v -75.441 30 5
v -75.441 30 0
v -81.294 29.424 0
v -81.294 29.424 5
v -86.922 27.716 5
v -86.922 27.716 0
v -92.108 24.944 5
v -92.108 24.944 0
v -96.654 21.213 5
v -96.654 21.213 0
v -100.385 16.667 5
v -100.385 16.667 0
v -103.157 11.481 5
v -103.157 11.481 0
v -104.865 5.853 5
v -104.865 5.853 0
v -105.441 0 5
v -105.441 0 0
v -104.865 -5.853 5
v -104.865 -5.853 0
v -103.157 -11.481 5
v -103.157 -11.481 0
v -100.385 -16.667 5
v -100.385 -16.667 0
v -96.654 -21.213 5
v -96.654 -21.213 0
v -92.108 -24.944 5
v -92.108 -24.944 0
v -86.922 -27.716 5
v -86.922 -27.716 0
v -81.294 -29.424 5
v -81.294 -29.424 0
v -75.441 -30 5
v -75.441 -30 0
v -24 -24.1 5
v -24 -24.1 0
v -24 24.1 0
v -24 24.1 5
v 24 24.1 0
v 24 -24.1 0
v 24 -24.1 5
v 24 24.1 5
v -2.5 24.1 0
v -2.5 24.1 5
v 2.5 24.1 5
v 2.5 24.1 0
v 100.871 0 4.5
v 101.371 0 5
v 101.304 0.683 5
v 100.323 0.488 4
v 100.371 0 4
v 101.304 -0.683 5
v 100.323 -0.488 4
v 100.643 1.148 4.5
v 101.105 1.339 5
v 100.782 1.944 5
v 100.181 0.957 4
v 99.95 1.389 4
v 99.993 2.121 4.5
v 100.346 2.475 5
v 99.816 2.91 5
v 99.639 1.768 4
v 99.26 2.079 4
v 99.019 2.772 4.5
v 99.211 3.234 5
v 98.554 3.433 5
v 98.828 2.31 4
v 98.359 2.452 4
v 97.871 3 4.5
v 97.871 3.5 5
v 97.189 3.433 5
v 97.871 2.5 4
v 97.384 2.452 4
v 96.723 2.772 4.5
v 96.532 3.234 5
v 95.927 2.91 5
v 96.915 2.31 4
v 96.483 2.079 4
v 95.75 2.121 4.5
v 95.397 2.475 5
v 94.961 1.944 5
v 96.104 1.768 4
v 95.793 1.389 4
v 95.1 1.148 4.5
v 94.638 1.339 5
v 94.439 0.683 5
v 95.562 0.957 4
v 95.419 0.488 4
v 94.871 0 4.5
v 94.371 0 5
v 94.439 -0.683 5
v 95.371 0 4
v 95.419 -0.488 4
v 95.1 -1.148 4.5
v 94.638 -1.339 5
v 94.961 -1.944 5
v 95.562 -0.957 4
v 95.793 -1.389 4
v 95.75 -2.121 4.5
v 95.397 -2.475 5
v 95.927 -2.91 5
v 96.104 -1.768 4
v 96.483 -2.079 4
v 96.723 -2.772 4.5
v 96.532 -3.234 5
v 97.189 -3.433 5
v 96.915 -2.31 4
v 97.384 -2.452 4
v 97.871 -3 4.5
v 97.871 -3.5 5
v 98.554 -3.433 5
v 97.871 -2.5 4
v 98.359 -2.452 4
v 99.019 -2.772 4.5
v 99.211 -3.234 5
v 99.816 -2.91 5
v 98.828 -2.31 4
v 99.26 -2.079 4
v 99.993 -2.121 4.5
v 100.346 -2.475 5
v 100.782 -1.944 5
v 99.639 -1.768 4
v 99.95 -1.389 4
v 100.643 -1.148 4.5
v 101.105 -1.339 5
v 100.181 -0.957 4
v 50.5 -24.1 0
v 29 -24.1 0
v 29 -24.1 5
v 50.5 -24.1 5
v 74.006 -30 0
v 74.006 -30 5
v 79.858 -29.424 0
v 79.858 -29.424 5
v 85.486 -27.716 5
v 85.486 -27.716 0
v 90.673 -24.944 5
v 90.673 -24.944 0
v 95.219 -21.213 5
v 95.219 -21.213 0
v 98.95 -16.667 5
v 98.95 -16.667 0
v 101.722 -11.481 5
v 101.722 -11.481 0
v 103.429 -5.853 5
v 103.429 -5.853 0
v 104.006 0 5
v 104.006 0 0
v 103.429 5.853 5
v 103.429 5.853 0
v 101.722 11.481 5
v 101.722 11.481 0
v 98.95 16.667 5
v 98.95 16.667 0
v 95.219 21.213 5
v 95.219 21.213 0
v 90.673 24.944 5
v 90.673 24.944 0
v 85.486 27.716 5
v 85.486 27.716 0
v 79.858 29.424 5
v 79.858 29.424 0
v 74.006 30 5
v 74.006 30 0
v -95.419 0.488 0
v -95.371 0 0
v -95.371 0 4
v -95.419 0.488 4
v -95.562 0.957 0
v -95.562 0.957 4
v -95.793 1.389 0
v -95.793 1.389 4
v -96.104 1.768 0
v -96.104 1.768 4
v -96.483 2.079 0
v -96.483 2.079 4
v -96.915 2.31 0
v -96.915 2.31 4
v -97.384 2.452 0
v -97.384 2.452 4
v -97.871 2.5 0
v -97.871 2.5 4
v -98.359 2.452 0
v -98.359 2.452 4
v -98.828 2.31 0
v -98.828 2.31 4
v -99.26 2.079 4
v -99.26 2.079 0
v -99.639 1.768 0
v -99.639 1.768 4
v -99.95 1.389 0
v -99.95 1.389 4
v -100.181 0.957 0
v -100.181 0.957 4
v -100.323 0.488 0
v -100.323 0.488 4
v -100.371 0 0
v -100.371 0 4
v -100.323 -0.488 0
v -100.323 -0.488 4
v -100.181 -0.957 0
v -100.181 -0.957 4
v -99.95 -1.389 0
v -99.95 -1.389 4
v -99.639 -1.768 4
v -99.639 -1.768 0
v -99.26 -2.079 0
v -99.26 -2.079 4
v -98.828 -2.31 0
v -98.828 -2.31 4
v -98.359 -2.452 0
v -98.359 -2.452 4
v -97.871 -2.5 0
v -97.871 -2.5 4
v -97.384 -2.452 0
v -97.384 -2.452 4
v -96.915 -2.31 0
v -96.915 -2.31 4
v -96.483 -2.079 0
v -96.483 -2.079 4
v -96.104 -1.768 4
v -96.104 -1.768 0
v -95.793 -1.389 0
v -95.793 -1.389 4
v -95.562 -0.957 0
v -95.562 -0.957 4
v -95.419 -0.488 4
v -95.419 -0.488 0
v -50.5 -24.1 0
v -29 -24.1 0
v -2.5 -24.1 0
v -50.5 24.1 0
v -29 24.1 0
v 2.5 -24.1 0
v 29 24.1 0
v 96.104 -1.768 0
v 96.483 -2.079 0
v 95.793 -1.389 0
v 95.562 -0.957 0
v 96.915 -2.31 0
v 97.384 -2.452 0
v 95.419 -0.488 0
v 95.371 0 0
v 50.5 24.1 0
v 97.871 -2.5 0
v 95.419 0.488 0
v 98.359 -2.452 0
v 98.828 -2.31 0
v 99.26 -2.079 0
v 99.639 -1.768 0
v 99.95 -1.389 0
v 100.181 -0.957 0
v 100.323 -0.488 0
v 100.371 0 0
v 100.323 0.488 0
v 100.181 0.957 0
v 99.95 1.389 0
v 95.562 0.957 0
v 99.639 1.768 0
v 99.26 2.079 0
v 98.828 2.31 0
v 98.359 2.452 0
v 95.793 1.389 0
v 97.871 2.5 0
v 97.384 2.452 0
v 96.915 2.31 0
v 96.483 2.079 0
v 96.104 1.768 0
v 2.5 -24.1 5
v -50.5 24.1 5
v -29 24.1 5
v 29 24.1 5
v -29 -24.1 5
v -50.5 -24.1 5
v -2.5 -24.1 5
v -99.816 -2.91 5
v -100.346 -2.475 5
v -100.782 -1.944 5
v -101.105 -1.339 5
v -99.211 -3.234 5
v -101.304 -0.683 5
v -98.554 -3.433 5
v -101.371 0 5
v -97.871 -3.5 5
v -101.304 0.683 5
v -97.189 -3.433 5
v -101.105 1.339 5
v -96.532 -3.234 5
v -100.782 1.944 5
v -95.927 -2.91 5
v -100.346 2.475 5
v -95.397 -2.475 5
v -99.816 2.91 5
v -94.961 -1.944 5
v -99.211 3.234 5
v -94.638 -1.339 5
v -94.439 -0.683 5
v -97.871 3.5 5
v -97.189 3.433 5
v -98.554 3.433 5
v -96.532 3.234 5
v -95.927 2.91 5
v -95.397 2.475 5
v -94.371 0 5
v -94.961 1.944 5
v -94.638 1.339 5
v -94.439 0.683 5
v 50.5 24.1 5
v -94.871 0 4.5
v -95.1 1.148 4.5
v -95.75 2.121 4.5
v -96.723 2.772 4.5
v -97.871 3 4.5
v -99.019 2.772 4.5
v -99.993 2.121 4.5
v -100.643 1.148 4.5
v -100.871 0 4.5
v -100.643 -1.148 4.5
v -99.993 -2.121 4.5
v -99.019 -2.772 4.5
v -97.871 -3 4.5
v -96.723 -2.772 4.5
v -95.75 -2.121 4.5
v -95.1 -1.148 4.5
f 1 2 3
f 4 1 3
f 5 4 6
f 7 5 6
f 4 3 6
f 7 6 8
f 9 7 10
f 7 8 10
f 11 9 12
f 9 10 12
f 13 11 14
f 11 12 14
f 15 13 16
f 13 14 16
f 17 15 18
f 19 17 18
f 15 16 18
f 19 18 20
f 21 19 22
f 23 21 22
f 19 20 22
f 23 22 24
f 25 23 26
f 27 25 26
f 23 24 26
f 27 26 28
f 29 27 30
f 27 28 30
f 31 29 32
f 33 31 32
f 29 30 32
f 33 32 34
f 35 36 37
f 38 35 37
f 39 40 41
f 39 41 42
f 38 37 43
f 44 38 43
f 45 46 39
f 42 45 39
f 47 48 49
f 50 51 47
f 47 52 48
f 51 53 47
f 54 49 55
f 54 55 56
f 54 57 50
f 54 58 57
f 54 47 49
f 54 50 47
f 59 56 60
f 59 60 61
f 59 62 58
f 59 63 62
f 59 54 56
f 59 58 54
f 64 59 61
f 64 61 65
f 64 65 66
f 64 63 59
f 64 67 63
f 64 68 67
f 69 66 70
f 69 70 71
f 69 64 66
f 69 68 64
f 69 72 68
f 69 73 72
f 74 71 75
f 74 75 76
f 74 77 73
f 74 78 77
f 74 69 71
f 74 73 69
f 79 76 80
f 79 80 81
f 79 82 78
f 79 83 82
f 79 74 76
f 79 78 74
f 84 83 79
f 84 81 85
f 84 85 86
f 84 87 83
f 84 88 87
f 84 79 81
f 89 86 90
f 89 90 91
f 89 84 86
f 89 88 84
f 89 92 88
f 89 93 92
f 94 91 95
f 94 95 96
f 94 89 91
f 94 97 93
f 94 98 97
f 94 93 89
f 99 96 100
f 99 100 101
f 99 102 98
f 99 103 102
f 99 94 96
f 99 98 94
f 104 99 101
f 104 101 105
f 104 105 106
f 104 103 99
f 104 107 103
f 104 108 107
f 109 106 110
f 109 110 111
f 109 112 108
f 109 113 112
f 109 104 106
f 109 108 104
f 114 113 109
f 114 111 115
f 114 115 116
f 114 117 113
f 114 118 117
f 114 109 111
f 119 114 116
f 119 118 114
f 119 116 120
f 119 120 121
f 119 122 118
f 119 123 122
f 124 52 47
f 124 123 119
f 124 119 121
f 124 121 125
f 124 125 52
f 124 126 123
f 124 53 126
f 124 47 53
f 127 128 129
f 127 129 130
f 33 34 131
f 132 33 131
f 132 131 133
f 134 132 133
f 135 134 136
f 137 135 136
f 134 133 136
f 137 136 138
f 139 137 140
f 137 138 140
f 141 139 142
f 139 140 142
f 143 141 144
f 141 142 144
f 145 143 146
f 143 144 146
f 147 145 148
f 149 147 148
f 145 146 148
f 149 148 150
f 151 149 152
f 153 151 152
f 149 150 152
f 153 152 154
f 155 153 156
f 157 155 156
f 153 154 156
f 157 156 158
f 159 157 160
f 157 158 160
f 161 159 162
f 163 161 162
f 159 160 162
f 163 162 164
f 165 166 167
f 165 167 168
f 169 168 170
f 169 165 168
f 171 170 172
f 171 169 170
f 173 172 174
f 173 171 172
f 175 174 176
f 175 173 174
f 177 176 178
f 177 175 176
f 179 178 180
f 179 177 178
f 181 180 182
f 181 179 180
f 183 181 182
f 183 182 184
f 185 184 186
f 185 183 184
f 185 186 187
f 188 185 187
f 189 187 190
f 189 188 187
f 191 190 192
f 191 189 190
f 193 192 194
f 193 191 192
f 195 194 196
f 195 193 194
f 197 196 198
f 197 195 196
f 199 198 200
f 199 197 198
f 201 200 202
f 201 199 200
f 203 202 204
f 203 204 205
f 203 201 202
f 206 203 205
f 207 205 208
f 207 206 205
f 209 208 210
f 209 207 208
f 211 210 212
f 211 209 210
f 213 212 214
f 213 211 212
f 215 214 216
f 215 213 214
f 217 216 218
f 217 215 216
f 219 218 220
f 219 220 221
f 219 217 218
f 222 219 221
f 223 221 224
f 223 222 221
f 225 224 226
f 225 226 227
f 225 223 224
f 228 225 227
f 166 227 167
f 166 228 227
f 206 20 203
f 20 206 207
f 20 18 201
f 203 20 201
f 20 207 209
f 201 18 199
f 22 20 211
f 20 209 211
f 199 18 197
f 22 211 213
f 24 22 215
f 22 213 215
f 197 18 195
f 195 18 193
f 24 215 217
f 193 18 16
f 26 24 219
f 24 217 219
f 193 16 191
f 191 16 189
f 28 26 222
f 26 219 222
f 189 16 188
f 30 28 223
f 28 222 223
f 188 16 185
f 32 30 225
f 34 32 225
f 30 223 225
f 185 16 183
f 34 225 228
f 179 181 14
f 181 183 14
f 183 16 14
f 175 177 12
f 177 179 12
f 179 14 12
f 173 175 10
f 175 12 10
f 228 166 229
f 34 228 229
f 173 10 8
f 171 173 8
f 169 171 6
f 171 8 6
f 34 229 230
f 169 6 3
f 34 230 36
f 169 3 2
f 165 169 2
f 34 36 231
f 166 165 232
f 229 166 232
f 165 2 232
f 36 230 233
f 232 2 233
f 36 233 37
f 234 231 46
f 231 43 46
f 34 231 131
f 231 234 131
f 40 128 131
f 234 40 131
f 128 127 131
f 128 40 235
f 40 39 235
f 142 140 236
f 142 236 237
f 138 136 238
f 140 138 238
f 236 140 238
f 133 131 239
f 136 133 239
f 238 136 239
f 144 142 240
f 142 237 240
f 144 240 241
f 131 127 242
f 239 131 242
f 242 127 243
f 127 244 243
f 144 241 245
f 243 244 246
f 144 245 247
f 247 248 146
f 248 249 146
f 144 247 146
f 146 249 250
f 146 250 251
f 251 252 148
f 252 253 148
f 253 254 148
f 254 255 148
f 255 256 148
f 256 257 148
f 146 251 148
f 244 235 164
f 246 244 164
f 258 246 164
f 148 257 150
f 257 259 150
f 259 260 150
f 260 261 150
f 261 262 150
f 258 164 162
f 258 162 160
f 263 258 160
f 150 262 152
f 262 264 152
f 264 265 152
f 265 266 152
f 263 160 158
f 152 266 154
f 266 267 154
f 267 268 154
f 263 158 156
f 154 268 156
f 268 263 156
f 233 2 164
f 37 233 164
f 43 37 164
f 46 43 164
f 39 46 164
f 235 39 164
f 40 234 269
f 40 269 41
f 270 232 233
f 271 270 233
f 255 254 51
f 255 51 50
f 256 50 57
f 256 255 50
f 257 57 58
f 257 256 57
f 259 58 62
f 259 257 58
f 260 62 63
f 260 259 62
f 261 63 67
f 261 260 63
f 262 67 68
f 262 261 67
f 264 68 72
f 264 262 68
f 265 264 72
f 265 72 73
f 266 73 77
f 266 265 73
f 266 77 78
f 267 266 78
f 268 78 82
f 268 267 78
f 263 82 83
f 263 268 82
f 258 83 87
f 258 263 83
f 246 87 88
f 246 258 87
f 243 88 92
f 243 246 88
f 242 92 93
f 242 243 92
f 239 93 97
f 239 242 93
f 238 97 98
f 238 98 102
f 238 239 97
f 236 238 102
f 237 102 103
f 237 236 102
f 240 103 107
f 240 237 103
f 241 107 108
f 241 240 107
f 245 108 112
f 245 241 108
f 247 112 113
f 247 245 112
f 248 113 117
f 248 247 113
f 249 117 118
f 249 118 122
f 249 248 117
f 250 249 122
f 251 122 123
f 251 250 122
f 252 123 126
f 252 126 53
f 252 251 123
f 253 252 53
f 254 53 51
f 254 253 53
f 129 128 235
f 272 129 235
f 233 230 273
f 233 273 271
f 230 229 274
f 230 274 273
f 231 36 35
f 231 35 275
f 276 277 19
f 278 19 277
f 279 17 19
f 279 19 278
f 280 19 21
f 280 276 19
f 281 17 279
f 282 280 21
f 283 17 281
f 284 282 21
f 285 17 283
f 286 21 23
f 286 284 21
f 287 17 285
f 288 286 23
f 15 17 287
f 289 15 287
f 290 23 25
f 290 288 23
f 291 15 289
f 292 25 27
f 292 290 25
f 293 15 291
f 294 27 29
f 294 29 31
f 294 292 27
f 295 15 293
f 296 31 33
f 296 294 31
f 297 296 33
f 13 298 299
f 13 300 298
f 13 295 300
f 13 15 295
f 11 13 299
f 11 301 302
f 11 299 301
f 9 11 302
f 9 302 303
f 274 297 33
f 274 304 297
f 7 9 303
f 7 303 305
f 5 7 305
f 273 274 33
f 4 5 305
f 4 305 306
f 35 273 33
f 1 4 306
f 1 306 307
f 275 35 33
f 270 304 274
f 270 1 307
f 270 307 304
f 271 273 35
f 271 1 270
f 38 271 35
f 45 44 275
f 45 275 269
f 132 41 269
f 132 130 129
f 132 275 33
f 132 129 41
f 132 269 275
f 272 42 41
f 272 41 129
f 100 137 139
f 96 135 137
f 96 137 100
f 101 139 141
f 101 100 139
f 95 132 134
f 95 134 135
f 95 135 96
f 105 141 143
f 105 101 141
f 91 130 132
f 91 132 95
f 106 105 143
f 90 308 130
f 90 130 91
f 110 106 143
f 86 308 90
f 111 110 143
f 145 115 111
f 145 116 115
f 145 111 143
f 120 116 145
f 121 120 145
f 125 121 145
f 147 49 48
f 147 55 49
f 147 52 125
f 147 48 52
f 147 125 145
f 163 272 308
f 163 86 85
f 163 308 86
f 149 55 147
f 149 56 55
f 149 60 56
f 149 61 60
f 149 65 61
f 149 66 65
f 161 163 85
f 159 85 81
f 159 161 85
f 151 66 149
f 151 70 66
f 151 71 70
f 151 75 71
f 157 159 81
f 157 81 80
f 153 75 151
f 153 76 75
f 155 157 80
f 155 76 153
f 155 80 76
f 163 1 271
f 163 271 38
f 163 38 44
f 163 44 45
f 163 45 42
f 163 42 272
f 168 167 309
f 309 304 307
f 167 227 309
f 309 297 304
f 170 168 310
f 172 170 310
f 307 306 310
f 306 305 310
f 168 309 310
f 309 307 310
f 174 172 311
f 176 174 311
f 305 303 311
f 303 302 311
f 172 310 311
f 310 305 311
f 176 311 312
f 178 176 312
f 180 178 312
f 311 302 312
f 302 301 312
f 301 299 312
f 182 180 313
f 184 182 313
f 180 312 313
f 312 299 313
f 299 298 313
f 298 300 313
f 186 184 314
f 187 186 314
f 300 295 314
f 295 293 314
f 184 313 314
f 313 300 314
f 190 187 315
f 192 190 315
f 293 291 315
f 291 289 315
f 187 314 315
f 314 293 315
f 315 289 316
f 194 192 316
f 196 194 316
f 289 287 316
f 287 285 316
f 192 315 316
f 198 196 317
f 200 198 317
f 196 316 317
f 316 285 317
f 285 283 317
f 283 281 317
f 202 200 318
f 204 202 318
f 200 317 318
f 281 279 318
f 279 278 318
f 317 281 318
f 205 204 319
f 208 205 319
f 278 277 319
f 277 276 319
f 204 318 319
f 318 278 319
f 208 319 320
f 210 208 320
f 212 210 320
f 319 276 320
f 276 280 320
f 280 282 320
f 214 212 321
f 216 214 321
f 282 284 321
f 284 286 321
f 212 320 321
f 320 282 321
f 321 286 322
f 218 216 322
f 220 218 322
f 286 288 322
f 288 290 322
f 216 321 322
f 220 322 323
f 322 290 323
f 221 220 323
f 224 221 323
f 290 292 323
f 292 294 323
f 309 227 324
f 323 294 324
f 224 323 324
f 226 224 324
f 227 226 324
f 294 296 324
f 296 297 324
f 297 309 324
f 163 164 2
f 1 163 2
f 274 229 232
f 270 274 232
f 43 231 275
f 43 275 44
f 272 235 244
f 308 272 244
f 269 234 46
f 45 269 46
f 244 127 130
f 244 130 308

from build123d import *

# Parameters (mm, degrees)
F0_R     = 2.5
F0_W     = 21.5
F0_H     = 48.2
F1_DEPTH = 5
F2_SIZE  = 1
F3_SIZE  = 1


with BuildPart() as f1:
    # F0 (on Top) → F1 (new body)
    with BuildSketch(Plane.XY):
        with BuildLine():
            Line((74.005723, 30), (-75.4411, 30))
            ThreePointArc((-75.4411, 30), (-105.4411, 0), (-75.4411, -30))
            Line((-75.4411, -30), (74.005723, -30))
            ThreePointArc((74.005723, -30), (104.005723, 0), (74.005723, 30))
        make_face()
        with Locations((-97.871438, 0)):
            Circle(F0_R, mode=Mode.SUBTRACT)
        with Locations((-39.75, 0)):
            Rectangle(F0_W, F0_H, mode=Mode.SUBTRACT)
        with Locations((-13.25, 0)):
            Rectangle(F0_W, F0_H, mode=Mode.SUBTRACT)
        with Locations((13.25, 0)):
            Rectangle(F0_W, F0_H, mode=Mode.SUBTRACT)
        with Locations((39.75, 0)):
            Rectangle(F0_W, F0_H, mode=Mode.SUBTRACT)
        with Locations((97.871438, 0)):
            Circle(F0_R, mode=Mode.SUBTRACT)
    extrude(amount=F1_DEPTH)

    # F2
    f2_edges = [f1.edges().sort_by_distance(p)[0] for p in [
        (-100.371438, 0, 5),
    ]]
    chamfer(f2_edges, length=F2_SIZE)

    # F3
    f3_edges = [f1.edges().sort_by_distance(p)[0] for p in [
        (95.371438, 0, 5),
    ]]
    chamfer(f3_edges, length=F3_SIZE)


solid = f1.part
